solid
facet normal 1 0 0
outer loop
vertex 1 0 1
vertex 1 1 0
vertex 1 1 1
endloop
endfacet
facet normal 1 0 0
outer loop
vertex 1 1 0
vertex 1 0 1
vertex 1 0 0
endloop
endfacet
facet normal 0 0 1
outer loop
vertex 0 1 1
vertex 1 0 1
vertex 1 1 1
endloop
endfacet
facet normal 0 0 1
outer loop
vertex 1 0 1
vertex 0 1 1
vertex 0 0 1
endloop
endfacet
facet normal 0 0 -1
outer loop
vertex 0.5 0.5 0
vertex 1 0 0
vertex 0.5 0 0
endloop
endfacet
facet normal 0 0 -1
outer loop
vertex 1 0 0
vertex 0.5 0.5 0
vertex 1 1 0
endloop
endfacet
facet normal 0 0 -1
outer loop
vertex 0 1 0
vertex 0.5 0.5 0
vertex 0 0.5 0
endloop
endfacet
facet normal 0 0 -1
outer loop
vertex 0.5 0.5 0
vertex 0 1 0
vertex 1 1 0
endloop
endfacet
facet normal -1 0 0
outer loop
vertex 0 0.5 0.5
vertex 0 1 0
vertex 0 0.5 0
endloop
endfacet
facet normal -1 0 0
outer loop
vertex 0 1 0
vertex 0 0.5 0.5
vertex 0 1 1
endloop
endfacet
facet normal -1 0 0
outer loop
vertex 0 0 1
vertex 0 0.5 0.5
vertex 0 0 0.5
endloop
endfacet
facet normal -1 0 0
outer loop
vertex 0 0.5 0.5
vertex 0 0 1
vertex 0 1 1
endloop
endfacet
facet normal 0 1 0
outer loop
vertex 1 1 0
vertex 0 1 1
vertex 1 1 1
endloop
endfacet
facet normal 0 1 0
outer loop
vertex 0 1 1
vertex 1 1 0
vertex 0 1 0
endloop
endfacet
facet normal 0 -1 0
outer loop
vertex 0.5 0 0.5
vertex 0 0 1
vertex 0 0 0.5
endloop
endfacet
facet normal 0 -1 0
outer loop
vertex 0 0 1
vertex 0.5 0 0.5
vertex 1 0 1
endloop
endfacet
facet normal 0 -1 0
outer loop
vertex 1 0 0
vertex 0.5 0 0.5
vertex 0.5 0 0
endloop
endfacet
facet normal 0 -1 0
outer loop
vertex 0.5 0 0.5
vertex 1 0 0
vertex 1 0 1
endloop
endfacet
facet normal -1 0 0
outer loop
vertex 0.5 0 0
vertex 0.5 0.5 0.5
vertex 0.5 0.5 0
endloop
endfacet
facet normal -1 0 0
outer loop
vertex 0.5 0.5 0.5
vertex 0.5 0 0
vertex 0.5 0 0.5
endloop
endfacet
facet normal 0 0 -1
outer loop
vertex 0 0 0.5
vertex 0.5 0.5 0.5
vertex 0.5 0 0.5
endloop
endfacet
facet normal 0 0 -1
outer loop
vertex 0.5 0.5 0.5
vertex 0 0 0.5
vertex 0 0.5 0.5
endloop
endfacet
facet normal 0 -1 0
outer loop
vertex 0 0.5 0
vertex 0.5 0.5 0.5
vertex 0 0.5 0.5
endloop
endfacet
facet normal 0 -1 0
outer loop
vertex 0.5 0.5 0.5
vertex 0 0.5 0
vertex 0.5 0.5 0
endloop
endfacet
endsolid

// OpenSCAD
difference() {
  translate([0.5000000000, 0.5000000000, 0.5000000000]) {
    translate([-0.5000000000, -0.5000000000, -0.5000000000]) {
      cube([1, 1, 1]);
    }
  }
  translate([0.2500000000, 0.2500000000, 0.2500000000]) {
    scale([0.5000000000, 0.5000000000, 0.5000000000]) {
      translate([-0.5000000000, -0.5000000000, -0.5000000000]) {
        cube([1, 1, 1]);
      }
    }
  }
}
